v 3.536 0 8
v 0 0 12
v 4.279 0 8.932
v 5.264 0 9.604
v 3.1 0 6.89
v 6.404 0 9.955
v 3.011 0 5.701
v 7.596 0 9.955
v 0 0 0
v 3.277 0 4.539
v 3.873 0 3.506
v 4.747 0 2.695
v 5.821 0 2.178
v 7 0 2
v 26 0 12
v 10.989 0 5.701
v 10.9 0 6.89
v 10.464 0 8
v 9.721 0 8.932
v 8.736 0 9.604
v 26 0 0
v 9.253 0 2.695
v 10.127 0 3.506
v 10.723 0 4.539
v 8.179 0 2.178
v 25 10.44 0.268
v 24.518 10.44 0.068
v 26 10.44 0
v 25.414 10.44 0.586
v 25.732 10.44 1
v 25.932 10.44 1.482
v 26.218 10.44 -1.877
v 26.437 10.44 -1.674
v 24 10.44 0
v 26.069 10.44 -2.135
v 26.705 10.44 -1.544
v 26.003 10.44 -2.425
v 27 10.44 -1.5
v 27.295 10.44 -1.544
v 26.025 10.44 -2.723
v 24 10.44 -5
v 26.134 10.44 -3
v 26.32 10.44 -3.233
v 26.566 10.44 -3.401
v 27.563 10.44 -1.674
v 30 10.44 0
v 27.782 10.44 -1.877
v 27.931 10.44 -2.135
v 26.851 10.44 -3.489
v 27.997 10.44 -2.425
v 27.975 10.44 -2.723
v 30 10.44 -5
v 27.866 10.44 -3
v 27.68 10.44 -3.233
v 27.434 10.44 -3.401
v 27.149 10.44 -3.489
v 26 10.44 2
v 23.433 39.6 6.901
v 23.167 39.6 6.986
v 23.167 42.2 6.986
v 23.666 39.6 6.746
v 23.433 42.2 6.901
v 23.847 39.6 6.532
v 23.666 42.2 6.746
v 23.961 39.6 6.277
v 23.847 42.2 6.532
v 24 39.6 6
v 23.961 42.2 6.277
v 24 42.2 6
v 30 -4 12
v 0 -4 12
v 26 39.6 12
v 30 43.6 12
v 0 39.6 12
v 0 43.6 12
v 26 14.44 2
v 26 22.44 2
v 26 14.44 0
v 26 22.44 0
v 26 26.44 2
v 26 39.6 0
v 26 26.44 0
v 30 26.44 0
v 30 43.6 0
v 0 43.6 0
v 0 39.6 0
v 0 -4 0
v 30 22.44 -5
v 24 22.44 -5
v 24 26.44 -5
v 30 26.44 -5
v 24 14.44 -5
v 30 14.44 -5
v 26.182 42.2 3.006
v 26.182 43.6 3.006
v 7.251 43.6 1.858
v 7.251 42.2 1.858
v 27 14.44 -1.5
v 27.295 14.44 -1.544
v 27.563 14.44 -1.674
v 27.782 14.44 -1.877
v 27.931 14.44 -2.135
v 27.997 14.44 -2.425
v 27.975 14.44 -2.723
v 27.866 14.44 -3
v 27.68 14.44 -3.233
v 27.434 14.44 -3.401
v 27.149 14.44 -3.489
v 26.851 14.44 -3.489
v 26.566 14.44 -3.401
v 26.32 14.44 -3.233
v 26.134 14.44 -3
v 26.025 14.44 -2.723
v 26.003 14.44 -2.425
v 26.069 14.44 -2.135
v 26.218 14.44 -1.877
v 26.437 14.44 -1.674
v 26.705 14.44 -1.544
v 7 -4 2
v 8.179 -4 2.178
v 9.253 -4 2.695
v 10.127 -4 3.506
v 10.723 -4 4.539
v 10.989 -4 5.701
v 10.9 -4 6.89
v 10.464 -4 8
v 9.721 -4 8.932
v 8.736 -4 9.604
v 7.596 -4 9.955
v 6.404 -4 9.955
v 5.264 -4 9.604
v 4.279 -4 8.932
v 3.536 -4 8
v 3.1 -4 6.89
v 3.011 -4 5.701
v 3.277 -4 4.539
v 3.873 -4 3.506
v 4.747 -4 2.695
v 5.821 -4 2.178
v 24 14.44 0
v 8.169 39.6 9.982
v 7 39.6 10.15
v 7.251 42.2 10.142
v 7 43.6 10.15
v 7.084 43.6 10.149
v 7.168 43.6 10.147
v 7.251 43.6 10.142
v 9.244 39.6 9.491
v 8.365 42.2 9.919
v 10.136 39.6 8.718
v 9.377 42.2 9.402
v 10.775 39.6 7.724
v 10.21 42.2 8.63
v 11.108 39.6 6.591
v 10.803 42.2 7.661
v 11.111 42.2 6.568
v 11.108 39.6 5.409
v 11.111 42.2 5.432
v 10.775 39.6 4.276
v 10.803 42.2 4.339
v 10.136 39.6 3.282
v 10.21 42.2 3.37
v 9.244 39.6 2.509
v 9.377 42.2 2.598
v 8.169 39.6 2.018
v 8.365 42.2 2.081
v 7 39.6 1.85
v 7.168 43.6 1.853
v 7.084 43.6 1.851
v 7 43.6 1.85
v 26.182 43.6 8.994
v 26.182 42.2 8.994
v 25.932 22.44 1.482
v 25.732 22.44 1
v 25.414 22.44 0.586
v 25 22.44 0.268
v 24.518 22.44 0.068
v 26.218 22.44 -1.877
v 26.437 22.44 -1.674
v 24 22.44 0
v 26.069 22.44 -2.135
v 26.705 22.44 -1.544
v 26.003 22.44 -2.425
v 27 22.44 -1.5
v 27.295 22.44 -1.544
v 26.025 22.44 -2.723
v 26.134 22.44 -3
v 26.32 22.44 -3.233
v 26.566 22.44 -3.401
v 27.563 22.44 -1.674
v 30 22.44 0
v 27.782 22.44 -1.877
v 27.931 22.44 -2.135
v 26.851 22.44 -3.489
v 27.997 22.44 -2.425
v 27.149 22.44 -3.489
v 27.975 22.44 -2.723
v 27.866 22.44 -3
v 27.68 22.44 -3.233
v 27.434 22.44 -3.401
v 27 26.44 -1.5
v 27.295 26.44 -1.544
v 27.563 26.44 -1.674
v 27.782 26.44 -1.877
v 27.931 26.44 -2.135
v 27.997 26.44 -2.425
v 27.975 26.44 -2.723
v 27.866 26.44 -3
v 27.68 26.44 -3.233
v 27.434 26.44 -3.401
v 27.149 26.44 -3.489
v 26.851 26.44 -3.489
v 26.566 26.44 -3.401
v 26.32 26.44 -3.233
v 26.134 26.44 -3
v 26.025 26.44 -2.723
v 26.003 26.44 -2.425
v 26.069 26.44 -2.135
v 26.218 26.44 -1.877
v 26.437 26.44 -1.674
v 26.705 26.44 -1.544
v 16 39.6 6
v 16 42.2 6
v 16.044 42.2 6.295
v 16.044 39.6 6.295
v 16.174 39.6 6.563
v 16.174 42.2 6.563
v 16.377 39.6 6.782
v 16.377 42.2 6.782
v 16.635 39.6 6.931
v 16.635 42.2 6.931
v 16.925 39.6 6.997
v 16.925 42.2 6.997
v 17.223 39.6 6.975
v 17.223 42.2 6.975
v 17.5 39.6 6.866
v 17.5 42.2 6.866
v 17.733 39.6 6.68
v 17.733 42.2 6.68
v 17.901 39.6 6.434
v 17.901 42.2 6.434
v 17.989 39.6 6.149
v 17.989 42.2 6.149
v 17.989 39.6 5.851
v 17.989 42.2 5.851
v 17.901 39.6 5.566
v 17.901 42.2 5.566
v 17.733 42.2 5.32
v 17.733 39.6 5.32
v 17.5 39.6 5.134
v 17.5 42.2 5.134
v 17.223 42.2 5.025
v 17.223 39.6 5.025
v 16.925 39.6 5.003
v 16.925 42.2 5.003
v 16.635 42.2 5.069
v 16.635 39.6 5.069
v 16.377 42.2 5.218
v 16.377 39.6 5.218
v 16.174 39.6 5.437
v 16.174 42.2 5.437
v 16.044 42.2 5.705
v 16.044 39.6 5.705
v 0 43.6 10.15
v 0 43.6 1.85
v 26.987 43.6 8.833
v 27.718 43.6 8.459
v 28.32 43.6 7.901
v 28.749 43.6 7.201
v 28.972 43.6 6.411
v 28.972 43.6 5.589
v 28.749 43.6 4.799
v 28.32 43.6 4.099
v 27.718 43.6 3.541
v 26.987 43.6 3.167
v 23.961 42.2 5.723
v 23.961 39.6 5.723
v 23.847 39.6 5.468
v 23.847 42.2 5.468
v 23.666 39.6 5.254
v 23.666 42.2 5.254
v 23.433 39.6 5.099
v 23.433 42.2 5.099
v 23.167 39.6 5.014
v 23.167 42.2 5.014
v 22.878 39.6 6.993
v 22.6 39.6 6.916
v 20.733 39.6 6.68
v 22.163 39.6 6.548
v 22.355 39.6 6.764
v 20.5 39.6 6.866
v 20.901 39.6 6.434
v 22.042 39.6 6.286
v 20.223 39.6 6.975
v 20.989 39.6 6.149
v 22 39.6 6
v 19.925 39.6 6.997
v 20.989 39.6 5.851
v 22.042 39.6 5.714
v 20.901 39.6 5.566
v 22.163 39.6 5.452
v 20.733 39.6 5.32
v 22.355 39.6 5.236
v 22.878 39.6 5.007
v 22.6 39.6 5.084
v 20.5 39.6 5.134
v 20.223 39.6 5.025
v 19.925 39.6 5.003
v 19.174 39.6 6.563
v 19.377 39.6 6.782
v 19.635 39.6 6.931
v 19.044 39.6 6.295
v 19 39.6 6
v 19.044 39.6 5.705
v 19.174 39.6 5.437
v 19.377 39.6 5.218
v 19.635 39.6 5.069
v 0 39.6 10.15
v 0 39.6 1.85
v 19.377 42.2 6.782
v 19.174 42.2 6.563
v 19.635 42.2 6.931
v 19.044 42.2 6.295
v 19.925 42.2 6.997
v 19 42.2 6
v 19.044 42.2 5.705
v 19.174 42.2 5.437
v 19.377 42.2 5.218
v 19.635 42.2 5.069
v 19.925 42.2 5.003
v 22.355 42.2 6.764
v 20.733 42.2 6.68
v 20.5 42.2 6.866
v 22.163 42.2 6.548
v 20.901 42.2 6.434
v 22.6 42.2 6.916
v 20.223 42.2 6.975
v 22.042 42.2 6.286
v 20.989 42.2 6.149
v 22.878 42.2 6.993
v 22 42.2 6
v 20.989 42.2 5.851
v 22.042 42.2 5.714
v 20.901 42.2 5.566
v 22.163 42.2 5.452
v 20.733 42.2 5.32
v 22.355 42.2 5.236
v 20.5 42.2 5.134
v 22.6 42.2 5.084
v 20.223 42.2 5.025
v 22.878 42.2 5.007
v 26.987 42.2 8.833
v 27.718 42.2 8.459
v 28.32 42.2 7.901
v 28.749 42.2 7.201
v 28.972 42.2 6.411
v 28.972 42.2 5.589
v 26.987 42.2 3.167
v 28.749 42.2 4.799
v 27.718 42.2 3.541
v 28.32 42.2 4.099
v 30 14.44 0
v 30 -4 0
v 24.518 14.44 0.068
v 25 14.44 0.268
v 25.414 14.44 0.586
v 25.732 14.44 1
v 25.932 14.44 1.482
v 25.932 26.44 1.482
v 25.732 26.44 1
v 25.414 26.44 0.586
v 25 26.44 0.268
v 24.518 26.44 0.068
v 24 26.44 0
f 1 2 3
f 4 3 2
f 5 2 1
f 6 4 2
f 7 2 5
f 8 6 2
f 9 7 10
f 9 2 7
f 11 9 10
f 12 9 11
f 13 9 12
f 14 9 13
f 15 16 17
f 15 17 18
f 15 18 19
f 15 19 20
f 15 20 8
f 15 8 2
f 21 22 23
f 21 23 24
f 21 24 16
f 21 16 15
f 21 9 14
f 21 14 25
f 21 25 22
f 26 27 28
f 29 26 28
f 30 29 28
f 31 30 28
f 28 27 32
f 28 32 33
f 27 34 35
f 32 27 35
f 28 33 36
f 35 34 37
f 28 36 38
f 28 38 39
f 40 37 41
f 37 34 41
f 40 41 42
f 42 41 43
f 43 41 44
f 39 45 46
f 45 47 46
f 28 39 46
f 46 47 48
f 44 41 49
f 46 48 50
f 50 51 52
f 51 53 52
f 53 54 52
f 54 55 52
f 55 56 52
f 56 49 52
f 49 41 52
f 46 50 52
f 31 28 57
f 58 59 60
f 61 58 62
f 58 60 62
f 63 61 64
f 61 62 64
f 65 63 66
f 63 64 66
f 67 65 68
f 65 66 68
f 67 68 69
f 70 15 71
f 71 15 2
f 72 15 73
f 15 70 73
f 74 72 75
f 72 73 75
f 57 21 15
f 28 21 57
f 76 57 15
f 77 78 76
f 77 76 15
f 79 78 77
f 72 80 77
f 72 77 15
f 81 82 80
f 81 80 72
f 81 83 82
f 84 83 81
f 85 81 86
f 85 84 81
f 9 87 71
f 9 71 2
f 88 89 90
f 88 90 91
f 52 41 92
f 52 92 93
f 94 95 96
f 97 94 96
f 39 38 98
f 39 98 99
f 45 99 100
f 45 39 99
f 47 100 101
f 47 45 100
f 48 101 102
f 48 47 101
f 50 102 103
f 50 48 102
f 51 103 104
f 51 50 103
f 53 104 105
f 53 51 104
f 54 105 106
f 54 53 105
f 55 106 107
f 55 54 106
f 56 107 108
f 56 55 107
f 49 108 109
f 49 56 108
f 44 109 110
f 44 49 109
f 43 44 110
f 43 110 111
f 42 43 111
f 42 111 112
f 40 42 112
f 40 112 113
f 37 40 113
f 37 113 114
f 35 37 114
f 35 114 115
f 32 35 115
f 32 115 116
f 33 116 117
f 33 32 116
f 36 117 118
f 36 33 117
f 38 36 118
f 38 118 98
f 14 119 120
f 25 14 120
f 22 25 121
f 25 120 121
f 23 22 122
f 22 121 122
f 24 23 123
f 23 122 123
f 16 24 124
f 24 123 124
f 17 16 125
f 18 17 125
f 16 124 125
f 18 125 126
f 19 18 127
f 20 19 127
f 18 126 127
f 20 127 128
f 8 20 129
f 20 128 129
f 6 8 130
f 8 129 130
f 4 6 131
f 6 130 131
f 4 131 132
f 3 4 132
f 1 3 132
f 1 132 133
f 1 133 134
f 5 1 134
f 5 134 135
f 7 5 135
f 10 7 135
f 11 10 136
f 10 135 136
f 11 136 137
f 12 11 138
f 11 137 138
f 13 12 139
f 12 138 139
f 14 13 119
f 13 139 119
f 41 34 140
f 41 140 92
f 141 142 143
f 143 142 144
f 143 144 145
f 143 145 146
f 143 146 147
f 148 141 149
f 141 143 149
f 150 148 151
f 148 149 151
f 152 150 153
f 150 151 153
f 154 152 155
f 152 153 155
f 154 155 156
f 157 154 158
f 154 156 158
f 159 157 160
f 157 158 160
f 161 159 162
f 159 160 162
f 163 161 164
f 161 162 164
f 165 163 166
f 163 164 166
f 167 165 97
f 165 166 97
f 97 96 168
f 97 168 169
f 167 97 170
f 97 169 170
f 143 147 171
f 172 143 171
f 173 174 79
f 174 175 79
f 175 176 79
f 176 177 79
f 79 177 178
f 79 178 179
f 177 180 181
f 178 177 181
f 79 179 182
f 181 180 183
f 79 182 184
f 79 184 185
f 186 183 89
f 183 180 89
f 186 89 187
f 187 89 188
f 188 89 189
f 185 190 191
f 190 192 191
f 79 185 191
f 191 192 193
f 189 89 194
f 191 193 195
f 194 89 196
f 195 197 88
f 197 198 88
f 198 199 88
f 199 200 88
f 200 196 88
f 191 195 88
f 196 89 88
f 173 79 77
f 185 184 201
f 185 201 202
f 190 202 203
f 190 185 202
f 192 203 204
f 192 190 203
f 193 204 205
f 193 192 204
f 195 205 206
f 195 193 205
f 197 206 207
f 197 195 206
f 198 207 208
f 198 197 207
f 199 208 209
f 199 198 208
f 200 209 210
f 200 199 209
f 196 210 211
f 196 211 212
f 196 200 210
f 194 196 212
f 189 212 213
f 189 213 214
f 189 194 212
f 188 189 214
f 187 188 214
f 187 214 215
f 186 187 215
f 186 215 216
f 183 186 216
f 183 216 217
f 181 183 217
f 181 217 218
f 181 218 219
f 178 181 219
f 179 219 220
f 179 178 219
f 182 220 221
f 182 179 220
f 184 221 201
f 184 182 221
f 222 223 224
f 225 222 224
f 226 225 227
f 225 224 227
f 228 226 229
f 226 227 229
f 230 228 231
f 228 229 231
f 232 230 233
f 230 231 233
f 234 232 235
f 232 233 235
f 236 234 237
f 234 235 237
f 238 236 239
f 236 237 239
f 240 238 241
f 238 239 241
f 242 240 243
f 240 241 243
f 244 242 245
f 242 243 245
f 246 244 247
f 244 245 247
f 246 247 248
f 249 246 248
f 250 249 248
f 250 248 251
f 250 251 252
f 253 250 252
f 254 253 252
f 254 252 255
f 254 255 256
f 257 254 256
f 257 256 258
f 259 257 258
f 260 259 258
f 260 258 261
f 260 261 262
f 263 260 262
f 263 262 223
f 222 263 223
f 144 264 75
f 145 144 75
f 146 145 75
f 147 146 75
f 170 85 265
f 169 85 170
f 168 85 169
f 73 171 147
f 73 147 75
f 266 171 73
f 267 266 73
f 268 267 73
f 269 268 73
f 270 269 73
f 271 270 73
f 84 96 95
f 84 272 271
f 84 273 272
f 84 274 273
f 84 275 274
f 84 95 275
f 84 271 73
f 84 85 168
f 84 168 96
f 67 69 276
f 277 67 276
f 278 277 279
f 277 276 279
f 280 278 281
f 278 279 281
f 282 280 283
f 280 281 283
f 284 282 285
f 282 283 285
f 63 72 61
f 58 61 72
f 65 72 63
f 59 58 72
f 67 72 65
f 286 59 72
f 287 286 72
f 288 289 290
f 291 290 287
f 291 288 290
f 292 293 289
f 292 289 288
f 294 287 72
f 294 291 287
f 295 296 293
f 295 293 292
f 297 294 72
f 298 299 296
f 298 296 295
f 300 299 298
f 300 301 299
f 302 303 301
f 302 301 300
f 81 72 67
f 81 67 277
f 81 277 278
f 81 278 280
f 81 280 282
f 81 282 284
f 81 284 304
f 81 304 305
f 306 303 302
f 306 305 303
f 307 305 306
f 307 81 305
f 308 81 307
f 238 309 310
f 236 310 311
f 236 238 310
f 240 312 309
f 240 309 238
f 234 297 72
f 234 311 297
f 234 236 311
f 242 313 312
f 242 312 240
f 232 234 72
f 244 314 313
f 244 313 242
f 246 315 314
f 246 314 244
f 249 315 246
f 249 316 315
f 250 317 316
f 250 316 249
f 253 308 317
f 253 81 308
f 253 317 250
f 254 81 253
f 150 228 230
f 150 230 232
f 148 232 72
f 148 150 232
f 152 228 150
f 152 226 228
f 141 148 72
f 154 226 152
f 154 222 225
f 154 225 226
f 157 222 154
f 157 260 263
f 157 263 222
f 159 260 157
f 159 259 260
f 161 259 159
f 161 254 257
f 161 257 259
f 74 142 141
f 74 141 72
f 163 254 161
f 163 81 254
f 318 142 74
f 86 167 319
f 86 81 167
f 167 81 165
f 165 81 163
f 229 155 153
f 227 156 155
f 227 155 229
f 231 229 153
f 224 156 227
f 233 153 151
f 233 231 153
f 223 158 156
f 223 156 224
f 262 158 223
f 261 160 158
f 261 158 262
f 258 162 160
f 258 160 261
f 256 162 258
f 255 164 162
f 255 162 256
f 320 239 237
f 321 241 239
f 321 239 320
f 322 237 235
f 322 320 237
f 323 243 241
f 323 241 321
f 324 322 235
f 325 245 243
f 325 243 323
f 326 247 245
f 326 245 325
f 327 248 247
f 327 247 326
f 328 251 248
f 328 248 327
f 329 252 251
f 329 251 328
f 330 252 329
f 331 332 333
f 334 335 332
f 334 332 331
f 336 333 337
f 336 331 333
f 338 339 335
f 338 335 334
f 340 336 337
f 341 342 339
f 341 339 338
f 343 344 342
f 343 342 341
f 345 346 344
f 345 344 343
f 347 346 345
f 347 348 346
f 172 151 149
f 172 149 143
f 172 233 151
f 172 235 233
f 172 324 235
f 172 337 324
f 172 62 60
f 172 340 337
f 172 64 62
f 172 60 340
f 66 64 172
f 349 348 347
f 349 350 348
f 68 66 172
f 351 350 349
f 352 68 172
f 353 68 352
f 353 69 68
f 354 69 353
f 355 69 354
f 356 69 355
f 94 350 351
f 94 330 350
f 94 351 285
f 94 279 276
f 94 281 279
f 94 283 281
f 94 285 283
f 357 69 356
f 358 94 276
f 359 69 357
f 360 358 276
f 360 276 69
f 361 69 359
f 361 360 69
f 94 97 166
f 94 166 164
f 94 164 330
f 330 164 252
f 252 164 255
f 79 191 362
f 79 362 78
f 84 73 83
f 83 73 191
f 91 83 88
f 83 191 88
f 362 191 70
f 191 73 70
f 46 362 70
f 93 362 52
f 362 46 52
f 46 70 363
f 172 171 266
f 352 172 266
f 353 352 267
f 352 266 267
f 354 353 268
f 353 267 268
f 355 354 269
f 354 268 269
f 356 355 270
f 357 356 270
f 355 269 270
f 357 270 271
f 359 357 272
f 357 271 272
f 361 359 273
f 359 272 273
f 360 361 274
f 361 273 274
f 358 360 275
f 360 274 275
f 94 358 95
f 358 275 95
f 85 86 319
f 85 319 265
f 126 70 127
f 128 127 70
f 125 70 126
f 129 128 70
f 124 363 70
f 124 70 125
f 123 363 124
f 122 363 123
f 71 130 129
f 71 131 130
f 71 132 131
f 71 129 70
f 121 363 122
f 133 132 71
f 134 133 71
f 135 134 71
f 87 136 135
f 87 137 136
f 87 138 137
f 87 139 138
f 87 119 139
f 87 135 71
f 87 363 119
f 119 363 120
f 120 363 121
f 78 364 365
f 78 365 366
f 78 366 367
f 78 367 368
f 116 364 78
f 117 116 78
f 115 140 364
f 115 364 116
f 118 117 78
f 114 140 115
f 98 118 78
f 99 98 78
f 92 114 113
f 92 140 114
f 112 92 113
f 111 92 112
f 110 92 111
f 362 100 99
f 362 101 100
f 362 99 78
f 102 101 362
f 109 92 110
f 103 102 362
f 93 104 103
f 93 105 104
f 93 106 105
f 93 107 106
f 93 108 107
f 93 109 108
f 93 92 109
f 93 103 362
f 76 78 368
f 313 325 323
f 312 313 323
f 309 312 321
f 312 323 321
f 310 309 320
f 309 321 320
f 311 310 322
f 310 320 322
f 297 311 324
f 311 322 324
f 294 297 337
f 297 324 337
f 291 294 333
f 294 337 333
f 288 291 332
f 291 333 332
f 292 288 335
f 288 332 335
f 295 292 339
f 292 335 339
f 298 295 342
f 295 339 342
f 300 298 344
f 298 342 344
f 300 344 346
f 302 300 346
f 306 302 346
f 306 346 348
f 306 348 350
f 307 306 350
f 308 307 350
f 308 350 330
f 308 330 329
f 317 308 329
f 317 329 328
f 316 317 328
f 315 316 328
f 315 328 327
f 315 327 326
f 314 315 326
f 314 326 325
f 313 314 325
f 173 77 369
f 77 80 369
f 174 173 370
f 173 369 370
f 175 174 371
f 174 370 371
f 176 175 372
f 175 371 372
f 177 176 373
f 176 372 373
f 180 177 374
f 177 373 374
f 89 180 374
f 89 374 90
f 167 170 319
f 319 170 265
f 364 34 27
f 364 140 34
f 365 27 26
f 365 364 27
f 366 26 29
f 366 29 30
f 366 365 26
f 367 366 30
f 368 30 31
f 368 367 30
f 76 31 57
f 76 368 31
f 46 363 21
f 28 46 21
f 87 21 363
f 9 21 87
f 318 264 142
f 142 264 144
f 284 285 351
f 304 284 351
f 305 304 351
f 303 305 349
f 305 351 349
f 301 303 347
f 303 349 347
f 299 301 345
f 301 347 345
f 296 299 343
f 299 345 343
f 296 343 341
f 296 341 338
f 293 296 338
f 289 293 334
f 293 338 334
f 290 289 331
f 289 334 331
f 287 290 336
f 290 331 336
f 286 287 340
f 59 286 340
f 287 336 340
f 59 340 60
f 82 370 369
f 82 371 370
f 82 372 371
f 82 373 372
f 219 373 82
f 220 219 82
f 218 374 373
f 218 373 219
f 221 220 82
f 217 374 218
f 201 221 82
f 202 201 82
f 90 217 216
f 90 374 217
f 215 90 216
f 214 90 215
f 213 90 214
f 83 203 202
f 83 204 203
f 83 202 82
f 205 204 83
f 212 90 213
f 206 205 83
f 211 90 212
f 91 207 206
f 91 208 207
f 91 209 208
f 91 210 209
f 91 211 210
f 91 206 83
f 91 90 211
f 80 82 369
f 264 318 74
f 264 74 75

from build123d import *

# Parameters (mm, degrees)
EXTRUDE_1_DEPTH     = 12
SKETCH_2_R          = 4
CUT_EXTRUDE_1_DEPTH = 4
CUT_EXTRUDE_2_DEPTH = 4
SKETCH_4_R          = 1
CUT_EXTRUDE_3_DEPTH = 1.4
CUT_EXTRUDE_4_DEPTH = 4
EXTRUDE_START       = 6
SKETCH_5_W          = 6
SKETCH_5_H          = 5
SKETCH_5_R          = 1
EXTRUDE_2_DEPTH     = 4
EXTRUDE_START_2     = -6
SKETCH_5_2_W        = 6
SKETCH_5_2_H        = 5
SKETCH_5_2_R        = 1
EXTRUDE_3_DEPTH     = 4
FILLET_1_R          = 2


with BuildPart() as part:
    # 草图1 → 凸台-拉伸1 (new body)
    with BuildSketch(Plane.XY):
        Polygon((0, 0), (26, 0), (26, 39.6), (0, 39.6), (0, 43.6), (30, 43.6), (30, -4), (0, -4), align=None)
    extrude(amount=EXTRUDE_1_DEPTH)

    # 草图2 → 切除-拉伸1 (cut)
    with BuildSketch(Plane.XZ.offset(4)):
        with Locations(Location((7, 6, 0), (0, 0, 270))):
            Circle(SKETCH_2_R)
    extrude(amount=-CUT_EXTRUDE_1_DEPTH, mode=Mode.SUBTRACT)

    # 草图3 → 切除-拉伸2 (cut)
    with BuildSketch(Plane(origin=(0, 43.6, 0), x_dir=(1, 0, 0), z_dir=(0, 1, 0))):
        with BuildLine():
            Line((0, -1.85), (0, -10.15))
            Line((0, -10.15), (7, -10.15))
            ThreePointArc((7, -10.15), (11.15, -6), (7, -1.85))
            Line((7, -1.85), (0, -1.85))
        make_face()
    extrude(amount=-CUT_EXTRUDE_2_DEPTH, mode=Mode.SUBTRACT)

    # 草图4 → 切除-拉伸3 (cut)
    with BuildSketch(Plane(origin=(0, 43.6, 0), x_dir=(1, 0, 0), z_dir=(0, 1, 0))):
        with BuildLine():
            ThreePointArc((7.251184211, -1.857608602), (11.15, -6), (7.251184211, -10.142391398))
            Line((7.251184211, -10.142391398), (26.181578947, -8.994499806))
            ThreePointArc((26.181578947, -8.994499806), (29, -6), (26.181578947, -3.005500194))
            Line((26.181578947, -3.005500194), (7.251184211, -1.857608602))
        make_face()
        with Locations(Location((23, -6, 0), (0, 0, 270))):
            Circle(SKETCH_4_R, mode=Mode.SUBTRACT)
        with Locations(Location((20, -6, 0), (0, 0, 270))):
            Circle(SKETCH_4_R, mode=Mode.SUBTRACT)
        with Locations(Location((17, -6, 0), (0, 0, 270))):
            Circle(SKETCH_4_R, mode=Mode.SUBTRACT)
    extrude(amount=-CUT_EXTRUDE_3_DEPTH, mode=Mode.SUBTRACT)

    # 草图4<3> → 切除-拉伸4 (cut)
    with BuildSketch(Plane(origin=(0, 43.6, 0), x_dir=(1, 0, 0), z_dir=(0, 1, 0))):
        with BuildLine():
            ThreePointArc((23, -6), (23.041960108, -6.5), (23.166666667, -6.986013297))
            ThreePointArc((23.166666667, -6.986013297), (23.763762616, -6.645497224), (24, -6))
            Line((24, -6), (23, -6))
        make_face()
        with BuildLine():
            ThreePointArc((22, -6), (22.354502776, -6.763762616), (23.166666667, -6.986013297))
            ThreePointArc((23.166666667, -6.986013297), (23.041960108, -6.5), (23, -6))
            Line((23, -6), (22, -6))
        make_face()
        with BuildLine():
            ThreePointArc((23, -6), (23.041960108, -5.5), (23.166666667, -5.013986703))
            ThreePointArc((23.166666667, -5.013986703), (22.354502776, -5.236237384), (22, -6))
            Line((22, -6), (23, -6))
        make_face()
        with BuildLine():
            ThreePointArc((24, -6), (23.763762616, -5.354502776), (23.166666667, -5.013986703))
            ThreePointArc((23.166666667, -5.013986703), (23.041960108, -5.5), (23, -6))
            Line((23, -6), (24, -6))
        make_face()
        with BuildLine():
            ThreePointArc((21, -6), (20, -5), (19, -6))
            Line((19, -6), (21, -6))
        make_face()
        with BuildLine():
            Line((21, -6), (19, -6))
            ThreePointArc((19, -6), (20, -7), (21, -6))
        make_face()
        with BuildLine():
            ThreePointArc((18, -6), (17, -5), (16, -6))
            Line((16, -6), (18, -6))
        make_face()
        with BuildLine():
            Line((18, -6), (16, -6))
            ThreePointArc((16, -6), (17, -7), (18, -6))
        make_face()
    extrude(amount=-CUT_EXTRUDE_4_DEPTH, mode=Mode.SUBTRACT)

    # 草图5 → 凸台-拉伸2 (add)
    with BuildSketch(Plane(origin=(0, 16.44, 0), x_dir=(1, 0, 0), z_dir=(0, 1, 0)).offset(EXTRUDE_START)):
        with Locations((27, 2.5)):
            Rectangle(SKETCH_5_W, SKETCH_5_H)
        with Locations(Location((27, 2.5, 0), (0, 0, 270))):
            Circle(SKETCH_5_R, mode=Mode.SUBTRACT)
    extrude(amount=EXTRUDE_2_DEPTH)

    # 草图5<2> → 凸台-拉伸3 (add)
    with BuildSketch(Plane(origin=(0, 16.44, 0), x_dir=(1, 0, 0), z_dir=(0, 1, 0)).offset(EXTRUDE_START_2)):
        with Locations((27, 2.5)):
            Rectangle(SKETCH_5_2_W, SKETCH_5_2_H)
        with Locations(Location((27, 2.5, 0), (0, 0, 270))):
            Circle(SKETCH_5_2_R, mode=Mode.SUBTRACT)
    extrude(amount=EXTRUDE_3_DEPTH)

    # 圆角1
    fillet_1_edges = [part.edges().sort_by_distance(p)[0] for p in [
        (26, 12.44, 0),
        (26, 24.44, 0),
    ]]
    fillet(fillet_1_edges, radius=FILLET_1_R - 0.0001)  # a hair under: the kernel refuses the full size


solid = part.part
